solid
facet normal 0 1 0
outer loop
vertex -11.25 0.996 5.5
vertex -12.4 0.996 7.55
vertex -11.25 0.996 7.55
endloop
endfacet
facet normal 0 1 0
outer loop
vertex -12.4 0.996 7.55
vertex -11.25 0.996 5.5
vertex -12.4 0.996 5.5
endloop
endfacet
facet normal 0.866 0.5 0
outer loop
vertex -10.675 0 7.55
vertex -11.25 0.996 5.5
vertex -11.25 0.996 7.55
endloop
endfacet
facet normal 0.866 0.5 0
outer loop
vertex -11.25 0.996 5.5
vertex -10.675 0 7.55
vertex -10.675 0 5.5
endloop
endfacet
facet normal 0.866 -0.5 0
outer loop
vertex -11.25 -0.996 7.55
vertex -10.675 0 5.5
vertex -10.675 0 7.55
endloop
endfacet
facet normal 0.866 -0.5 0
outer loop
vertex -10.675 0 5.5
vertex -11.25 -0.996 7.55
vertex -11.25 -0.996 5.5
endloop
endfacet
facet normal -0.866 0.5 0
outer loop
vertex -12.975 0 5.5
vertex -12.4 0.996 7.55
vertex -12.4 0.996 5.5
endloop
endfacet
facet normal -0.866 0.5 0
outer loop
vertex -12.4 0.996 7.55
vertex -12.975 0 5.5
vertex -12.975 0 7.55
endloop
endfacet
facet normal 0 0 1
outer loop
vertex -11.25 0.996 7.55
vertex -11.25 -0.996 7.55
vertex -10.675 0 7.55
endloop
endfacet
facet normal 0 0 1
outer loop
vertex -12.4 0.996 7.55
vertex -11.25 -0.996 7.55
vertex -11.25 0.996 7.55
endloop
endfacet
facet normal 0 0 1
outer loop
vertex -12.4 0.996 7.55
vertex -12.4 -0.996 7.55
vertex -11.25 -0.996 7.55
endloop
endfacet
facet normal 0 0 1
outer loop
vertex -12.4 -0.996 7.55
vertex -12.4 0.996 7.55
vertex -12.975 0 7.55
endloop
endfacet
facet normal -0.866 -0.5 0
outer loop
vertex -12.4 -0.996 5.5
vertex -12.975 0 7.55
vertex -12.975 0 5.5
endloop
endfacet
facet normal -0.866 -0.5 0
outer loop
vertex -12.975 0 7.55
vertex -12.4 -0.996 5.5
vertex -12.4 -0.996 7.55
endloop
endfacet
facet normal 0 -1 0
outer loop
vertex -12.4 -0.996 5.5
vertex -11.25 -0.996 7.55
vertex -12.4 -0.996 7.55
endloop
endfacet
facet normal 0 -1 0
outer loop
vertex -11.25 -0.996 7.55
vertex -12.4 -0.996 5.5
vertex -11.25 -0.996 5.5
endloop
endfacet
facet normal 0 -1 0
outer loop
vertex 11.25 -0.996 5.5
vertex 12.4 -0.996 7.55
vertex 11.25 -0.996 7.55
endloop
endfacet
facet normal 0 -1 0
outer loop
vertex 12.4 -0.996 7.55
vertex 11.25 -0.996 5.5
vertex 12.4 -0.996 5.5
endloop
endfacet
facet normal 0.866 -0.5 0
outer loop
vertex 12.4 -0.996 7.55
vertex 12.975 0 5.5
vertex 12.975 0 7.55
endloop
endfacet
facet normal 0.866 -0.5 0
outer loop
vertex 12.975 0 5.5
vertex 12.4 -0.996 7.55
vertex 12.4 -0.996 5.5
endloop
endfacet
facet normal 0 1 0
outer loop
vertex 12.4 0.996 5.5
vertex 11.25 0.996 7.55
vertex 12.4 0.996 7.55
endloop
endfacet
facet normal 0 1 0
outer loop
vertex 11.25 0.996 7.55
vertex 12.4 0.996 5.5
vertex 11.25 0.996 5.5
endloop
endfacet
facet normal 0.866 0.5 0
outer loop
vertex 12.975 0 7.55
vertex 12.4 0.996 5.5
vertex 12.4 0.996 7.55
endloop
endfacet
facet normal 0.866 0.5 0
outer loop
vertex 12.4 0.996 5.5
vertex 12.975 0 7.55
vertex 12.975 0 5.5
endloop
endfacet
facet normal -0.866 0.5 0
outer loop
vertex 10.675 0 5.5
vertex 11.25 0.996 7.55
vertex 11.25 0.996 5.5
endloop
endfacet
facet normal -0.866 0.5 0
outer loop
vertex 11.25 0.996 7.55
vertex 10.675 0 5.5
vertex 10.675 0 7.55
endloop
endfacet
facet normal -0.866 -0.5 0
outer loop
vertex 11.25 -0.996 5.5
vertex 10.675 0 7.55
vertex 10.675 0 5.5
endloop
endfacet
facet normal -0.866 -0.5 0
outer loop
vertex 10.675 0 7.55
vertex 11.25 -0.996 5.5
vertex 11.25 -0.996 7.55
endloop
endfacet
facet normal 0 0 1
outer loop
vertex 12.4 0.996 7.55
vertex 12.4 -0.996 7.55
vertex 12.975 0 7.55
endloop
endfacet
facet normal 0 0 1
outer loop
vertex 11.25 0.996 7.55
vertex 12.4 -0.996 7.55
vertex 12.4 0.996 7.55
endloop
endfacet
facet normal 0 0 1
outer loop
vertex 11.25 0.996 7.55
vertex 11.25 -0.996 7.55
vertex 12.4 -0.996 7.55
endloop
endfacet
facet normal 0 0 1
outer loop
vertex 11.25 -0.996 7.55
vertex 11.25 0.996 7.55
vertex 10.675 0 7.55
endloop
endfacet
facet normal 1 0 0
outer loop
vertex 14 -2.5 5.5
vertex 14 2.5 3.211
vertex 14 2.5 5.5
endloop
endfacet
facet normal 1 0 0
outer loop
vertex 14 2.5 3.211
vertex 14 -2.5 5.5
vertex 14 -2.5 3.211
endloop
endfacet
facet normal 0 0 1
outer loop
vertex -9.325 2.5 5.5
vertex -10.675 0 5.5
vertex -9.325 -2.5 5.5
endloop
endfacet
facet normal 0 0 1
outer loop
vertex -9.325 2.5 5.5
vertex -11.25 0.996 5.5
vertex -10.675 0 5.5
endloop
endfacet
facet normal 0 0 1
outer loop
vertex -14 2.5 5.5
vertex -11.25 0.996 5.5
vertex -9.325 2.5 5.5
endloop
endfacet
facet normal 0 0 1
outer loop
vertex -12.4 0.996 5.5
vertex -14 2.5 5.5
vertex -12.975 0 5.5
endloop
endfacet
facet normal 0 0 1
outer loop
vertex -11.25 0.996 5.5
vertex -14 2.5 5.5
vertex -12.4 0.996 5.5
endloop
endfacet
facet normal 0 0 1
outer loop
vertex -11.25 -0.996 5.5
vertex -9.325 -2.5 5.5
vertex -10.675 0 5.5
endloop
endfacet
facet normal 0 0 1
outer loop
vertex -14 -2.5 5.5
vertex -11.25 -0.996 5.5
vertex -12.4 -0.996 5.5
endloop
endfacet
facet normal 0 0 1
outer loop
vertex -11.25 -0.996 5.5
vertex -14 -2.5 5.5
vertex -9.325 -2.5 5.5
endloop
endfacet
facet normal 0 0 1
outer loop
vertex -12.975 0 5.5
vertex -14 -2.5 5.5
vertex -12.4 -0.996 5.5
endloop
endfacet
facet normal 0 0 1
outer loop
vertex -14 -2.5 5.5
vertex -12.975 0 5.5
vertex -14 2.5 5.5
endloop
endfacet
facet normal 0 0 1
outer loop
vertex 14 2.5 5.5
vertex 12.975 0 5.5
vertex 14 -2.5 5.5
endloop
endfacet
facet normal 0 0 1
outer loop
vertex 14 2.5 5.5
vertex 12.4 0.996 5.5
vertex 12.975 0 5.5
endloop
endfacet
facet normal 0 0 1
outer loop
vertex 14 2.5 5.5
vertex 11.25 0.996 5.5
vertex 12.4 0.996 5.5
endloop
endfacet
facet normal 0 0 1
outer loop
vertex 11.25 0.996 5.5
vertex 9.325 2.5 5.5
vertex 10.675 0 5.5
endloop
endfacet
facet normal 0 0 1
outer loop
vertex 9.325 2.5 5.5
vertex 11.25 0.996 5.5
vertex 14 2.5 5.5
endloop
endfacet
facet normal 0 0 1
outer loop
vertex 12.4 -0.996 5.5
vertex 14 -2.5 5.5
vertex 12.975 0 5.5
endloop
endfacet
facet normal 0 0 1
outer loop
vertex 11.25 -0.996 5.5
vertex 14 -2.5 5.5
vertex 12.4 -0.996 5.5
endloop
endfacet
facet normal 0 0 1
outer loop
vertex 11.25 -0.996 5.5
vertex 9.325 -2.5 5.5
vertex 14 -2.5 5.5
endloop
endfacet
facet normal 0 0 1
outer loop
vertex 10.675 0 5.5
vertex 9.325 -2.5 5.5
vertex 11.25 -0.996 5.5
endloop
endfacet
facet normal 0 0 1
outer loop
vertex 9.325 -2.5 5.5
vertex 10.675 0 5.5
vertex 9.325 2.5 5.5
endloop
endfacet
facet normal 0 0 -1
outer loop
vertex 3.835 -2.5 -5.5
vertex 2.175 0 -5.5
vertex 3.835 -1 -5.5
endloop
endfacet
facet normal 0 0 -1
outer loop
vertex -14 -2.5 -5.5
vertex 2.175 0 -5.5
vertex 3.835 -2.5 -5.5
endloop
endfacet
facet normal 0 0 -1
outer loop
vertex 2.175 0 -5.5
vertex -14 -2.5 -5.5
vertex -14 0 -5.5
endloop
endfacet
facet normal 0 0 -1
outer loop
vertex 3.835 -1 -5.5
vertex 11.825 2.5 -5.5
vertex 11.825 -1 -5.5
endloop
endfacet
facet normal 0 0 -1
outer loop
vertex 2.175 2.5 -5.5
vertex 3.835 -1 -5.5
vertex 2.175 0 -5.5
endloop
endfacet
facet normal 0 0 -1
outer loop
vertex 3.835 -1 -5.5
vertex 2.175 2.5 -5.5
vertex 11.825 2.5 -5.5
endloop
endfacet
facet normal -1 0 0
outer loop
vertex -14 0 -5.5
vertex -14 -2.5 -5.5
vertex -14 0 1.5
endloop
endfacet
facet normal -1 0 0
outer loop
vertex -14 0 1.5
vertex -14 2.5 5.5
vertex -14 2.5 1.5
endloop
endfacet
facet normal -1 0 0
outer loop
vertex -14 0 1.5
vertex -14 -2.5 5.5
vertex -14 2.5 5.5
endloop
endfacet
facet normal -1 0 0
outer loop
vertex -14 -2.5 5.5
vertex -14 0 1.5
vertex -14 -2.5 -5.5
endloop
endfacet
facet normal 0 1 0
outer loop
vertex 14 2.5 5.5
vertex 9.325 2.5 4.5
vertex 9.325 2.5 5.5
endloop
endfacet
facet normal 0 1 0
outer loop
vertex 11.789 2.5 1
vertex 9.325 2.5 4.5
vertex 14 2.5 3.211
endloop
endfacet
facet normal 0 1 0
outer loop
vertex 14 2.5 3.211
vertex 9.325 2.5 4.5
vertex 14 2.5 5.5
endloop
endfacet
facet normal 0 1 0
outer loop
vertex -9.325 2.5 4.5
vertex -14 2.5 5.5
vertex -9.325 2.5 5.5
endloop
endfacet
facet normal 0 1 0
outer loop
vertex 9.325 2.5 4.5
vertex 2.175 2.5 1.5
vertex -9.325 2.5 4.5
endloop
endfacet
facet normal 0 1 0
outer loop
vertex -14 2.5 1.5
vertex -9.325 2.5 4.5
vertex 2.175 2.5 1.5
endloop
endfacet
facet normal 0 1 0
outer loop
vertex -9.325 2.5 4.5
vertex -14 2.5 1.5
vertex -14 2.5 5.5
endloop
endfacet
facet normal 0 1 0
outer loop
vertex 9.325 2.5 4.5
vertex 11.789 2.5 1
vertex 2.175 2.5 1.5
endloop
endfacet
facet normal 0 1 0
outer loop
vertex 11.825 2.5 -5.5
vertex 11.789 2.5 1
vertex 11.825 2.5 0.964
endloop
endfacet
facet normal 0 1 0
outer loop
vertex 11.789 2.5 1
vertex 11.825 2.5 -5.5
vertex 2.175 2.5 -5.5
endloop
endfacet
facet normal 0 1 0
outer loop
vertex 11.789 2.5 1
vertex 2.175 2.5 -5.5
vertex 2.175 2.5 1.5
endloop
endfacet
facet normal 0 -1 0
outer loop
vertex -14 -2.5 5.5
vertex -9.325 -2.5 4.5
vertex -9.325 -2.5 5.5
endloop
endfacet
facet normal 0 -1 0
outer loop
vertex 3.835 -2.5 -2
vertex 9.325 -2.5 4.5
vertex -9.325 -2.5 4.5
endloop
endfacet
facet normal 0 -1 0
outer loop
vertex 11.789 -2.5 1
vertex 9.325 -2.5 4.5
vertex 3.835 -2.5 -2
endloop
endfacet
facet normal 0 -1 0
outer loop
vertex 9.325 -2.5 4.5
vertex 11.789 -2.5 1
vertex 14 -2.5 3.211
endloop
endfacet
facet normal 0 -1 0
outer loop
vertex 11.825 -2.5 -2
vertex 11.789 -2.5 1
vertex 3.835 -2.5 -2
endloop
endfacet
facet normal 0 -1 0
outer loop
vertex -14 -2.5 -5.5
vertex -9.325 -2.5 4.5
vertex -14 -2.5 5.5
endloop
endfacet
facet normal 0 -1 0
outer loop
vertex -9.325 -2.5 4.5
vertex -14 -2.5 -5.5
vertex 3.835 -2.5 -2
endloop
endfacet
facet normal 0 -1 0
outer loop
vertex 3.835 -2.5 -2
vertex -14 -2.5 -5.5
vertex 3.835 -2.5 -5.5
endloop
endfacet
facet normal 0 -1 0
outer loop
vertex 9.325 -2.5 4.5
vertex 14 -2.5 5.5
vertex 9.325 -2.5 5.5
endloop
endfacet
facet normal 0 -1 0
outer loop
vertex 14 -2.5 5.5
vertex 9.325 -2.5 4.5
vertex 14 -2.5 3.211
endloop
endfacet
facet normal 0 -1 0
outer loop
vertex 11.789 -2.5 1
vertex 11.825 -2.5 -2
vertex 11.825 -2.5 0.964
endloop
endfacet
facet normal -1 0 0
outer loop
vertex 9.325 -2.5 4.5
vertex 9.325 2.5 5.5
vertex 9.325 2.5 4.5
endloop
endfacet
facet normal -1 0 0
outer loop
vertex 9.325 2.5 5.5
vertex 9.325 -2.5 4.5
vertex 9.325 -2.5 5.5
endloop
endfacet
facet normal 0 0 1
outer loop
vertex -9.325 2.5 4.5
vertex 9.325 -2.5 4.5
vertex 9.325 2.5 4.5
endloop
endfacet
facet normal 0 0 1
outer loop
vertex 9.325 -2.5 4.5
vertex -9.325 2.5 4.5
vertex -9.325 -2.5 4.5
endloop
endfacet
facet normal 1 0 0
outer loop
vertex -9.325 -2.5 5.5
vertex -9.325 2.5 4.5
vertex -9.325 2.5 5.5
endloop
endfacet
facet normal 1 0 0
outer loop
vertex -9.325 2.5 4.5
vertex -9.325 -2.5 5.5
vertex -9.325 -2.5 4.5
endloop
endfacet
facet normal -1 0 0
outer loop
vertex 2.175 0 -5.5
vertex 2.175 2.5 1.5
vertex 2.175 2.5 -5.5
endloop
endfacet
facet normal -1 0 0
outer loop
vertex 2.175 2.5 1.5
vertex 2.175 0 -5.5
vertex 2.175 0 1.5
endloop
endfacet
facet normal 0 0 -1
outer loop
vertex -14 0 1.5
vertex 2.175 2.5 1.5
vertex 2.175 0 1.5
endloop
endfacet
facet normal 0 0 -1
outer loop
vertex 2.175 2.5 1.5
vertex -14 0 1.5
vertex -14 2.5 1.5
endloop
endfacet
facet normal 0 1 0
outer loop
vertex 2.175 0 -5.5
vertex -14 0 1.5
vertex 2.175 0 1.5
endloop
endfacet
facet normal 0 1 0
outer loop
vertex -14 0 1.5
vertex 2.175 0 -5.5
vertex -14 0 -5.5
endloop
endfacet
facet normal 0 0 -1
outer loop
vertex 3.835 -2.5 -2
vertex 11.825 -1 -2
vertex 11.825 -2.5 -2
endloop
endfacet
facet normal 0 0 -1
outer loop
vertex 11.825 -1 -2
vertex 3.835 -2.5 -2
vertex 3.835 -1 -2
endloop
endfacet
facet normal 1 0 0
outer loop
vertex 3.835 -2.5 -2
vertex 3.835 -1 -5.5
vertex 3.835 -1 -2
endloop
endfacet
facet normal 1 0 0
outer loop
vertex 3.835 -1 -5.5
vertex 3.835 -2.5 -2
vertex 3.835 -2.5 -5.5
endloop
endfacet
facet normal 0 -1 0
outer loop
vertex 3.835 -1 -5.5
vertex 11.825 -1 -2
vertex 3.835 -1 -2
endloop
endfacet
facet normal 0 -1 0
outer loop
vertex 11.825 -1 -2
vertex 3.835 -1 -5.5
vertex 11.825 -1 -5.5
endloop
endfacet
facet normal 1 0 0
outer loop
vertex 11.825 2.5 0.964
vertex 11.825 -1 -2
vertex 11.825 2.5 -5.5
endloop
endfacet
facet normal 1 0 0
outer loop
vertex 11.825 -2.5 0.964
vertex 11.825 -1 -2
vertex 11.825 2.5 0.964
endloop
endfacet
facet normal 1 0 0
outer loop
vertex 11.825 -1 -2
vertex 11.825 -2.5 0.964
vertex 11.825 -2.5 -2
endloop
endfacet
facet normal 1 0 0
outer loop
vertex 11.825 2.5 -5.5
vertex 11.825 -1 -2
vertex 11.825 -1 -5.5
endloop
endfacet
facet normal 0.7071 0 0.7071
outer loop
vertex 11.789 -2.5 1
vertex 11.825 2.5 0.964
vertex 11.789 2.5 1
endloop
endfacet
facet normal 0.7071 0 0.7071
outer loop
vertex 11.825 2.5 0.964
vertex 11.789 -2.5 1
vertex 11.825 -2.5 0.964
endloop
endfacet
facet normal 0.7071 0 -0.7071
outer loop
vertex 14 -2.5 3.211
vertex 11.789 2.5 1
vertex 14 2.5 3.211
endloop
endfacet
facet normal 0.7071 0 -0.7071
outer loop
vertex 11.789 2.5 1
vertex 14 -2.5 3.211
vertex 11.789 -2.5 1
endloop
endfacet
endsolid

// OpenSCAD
body=[28,5,11];
hole_d=2.3;
hole_h=2.0;
hole_dist=23.65;

hdmi_width=17;
hdmi_height=14;
audio_width=5;
audio_height=13;
voltage_width=8;
voltage_height=7;

difference()
{
  union()
  {
    cube(body,center=true);
    // screw pins
    for(i=[-1:2:1])
      translate([hole_dist/2*i,0,body[2]/2+hole_h/2])
      cylinder(d=hole_d,h=hole_h+0.1,$fn=6,center=true);
  }
  // cut clearing for ribbon cable
  translate([0,0,body[2]/2])
    cube([hole_dist-5,10,2],center=true);
  // cut bottom stand
  // dip switch 
  // hdmi capacitors
  translate([-hole_dist/2+hdmi_width/2-3,+5,-body[2]/2])
    cube([hdmi_width,10,hdmi_height],center=true);
  // voltage selector
  translate([+hole_dist/2-voltage_width/2+0.01,-6,-body[2]/2])
    cube([voltage_width,10,voltage_height],center=true);
  // audio jack
  translate([hole_dist/2+audio_width/2,0,-body[2]/2])
    cube([audio_width,10,audio_height],center=true);
  // 45 deg transtion
  translate([hole_dist/2+audio_width/2+1,0,-body[2]/2+audio_height-audio_width-1.5])
    rotate([0,45,0])
      cube([audio_width,10,audio_width],center=true);
}
